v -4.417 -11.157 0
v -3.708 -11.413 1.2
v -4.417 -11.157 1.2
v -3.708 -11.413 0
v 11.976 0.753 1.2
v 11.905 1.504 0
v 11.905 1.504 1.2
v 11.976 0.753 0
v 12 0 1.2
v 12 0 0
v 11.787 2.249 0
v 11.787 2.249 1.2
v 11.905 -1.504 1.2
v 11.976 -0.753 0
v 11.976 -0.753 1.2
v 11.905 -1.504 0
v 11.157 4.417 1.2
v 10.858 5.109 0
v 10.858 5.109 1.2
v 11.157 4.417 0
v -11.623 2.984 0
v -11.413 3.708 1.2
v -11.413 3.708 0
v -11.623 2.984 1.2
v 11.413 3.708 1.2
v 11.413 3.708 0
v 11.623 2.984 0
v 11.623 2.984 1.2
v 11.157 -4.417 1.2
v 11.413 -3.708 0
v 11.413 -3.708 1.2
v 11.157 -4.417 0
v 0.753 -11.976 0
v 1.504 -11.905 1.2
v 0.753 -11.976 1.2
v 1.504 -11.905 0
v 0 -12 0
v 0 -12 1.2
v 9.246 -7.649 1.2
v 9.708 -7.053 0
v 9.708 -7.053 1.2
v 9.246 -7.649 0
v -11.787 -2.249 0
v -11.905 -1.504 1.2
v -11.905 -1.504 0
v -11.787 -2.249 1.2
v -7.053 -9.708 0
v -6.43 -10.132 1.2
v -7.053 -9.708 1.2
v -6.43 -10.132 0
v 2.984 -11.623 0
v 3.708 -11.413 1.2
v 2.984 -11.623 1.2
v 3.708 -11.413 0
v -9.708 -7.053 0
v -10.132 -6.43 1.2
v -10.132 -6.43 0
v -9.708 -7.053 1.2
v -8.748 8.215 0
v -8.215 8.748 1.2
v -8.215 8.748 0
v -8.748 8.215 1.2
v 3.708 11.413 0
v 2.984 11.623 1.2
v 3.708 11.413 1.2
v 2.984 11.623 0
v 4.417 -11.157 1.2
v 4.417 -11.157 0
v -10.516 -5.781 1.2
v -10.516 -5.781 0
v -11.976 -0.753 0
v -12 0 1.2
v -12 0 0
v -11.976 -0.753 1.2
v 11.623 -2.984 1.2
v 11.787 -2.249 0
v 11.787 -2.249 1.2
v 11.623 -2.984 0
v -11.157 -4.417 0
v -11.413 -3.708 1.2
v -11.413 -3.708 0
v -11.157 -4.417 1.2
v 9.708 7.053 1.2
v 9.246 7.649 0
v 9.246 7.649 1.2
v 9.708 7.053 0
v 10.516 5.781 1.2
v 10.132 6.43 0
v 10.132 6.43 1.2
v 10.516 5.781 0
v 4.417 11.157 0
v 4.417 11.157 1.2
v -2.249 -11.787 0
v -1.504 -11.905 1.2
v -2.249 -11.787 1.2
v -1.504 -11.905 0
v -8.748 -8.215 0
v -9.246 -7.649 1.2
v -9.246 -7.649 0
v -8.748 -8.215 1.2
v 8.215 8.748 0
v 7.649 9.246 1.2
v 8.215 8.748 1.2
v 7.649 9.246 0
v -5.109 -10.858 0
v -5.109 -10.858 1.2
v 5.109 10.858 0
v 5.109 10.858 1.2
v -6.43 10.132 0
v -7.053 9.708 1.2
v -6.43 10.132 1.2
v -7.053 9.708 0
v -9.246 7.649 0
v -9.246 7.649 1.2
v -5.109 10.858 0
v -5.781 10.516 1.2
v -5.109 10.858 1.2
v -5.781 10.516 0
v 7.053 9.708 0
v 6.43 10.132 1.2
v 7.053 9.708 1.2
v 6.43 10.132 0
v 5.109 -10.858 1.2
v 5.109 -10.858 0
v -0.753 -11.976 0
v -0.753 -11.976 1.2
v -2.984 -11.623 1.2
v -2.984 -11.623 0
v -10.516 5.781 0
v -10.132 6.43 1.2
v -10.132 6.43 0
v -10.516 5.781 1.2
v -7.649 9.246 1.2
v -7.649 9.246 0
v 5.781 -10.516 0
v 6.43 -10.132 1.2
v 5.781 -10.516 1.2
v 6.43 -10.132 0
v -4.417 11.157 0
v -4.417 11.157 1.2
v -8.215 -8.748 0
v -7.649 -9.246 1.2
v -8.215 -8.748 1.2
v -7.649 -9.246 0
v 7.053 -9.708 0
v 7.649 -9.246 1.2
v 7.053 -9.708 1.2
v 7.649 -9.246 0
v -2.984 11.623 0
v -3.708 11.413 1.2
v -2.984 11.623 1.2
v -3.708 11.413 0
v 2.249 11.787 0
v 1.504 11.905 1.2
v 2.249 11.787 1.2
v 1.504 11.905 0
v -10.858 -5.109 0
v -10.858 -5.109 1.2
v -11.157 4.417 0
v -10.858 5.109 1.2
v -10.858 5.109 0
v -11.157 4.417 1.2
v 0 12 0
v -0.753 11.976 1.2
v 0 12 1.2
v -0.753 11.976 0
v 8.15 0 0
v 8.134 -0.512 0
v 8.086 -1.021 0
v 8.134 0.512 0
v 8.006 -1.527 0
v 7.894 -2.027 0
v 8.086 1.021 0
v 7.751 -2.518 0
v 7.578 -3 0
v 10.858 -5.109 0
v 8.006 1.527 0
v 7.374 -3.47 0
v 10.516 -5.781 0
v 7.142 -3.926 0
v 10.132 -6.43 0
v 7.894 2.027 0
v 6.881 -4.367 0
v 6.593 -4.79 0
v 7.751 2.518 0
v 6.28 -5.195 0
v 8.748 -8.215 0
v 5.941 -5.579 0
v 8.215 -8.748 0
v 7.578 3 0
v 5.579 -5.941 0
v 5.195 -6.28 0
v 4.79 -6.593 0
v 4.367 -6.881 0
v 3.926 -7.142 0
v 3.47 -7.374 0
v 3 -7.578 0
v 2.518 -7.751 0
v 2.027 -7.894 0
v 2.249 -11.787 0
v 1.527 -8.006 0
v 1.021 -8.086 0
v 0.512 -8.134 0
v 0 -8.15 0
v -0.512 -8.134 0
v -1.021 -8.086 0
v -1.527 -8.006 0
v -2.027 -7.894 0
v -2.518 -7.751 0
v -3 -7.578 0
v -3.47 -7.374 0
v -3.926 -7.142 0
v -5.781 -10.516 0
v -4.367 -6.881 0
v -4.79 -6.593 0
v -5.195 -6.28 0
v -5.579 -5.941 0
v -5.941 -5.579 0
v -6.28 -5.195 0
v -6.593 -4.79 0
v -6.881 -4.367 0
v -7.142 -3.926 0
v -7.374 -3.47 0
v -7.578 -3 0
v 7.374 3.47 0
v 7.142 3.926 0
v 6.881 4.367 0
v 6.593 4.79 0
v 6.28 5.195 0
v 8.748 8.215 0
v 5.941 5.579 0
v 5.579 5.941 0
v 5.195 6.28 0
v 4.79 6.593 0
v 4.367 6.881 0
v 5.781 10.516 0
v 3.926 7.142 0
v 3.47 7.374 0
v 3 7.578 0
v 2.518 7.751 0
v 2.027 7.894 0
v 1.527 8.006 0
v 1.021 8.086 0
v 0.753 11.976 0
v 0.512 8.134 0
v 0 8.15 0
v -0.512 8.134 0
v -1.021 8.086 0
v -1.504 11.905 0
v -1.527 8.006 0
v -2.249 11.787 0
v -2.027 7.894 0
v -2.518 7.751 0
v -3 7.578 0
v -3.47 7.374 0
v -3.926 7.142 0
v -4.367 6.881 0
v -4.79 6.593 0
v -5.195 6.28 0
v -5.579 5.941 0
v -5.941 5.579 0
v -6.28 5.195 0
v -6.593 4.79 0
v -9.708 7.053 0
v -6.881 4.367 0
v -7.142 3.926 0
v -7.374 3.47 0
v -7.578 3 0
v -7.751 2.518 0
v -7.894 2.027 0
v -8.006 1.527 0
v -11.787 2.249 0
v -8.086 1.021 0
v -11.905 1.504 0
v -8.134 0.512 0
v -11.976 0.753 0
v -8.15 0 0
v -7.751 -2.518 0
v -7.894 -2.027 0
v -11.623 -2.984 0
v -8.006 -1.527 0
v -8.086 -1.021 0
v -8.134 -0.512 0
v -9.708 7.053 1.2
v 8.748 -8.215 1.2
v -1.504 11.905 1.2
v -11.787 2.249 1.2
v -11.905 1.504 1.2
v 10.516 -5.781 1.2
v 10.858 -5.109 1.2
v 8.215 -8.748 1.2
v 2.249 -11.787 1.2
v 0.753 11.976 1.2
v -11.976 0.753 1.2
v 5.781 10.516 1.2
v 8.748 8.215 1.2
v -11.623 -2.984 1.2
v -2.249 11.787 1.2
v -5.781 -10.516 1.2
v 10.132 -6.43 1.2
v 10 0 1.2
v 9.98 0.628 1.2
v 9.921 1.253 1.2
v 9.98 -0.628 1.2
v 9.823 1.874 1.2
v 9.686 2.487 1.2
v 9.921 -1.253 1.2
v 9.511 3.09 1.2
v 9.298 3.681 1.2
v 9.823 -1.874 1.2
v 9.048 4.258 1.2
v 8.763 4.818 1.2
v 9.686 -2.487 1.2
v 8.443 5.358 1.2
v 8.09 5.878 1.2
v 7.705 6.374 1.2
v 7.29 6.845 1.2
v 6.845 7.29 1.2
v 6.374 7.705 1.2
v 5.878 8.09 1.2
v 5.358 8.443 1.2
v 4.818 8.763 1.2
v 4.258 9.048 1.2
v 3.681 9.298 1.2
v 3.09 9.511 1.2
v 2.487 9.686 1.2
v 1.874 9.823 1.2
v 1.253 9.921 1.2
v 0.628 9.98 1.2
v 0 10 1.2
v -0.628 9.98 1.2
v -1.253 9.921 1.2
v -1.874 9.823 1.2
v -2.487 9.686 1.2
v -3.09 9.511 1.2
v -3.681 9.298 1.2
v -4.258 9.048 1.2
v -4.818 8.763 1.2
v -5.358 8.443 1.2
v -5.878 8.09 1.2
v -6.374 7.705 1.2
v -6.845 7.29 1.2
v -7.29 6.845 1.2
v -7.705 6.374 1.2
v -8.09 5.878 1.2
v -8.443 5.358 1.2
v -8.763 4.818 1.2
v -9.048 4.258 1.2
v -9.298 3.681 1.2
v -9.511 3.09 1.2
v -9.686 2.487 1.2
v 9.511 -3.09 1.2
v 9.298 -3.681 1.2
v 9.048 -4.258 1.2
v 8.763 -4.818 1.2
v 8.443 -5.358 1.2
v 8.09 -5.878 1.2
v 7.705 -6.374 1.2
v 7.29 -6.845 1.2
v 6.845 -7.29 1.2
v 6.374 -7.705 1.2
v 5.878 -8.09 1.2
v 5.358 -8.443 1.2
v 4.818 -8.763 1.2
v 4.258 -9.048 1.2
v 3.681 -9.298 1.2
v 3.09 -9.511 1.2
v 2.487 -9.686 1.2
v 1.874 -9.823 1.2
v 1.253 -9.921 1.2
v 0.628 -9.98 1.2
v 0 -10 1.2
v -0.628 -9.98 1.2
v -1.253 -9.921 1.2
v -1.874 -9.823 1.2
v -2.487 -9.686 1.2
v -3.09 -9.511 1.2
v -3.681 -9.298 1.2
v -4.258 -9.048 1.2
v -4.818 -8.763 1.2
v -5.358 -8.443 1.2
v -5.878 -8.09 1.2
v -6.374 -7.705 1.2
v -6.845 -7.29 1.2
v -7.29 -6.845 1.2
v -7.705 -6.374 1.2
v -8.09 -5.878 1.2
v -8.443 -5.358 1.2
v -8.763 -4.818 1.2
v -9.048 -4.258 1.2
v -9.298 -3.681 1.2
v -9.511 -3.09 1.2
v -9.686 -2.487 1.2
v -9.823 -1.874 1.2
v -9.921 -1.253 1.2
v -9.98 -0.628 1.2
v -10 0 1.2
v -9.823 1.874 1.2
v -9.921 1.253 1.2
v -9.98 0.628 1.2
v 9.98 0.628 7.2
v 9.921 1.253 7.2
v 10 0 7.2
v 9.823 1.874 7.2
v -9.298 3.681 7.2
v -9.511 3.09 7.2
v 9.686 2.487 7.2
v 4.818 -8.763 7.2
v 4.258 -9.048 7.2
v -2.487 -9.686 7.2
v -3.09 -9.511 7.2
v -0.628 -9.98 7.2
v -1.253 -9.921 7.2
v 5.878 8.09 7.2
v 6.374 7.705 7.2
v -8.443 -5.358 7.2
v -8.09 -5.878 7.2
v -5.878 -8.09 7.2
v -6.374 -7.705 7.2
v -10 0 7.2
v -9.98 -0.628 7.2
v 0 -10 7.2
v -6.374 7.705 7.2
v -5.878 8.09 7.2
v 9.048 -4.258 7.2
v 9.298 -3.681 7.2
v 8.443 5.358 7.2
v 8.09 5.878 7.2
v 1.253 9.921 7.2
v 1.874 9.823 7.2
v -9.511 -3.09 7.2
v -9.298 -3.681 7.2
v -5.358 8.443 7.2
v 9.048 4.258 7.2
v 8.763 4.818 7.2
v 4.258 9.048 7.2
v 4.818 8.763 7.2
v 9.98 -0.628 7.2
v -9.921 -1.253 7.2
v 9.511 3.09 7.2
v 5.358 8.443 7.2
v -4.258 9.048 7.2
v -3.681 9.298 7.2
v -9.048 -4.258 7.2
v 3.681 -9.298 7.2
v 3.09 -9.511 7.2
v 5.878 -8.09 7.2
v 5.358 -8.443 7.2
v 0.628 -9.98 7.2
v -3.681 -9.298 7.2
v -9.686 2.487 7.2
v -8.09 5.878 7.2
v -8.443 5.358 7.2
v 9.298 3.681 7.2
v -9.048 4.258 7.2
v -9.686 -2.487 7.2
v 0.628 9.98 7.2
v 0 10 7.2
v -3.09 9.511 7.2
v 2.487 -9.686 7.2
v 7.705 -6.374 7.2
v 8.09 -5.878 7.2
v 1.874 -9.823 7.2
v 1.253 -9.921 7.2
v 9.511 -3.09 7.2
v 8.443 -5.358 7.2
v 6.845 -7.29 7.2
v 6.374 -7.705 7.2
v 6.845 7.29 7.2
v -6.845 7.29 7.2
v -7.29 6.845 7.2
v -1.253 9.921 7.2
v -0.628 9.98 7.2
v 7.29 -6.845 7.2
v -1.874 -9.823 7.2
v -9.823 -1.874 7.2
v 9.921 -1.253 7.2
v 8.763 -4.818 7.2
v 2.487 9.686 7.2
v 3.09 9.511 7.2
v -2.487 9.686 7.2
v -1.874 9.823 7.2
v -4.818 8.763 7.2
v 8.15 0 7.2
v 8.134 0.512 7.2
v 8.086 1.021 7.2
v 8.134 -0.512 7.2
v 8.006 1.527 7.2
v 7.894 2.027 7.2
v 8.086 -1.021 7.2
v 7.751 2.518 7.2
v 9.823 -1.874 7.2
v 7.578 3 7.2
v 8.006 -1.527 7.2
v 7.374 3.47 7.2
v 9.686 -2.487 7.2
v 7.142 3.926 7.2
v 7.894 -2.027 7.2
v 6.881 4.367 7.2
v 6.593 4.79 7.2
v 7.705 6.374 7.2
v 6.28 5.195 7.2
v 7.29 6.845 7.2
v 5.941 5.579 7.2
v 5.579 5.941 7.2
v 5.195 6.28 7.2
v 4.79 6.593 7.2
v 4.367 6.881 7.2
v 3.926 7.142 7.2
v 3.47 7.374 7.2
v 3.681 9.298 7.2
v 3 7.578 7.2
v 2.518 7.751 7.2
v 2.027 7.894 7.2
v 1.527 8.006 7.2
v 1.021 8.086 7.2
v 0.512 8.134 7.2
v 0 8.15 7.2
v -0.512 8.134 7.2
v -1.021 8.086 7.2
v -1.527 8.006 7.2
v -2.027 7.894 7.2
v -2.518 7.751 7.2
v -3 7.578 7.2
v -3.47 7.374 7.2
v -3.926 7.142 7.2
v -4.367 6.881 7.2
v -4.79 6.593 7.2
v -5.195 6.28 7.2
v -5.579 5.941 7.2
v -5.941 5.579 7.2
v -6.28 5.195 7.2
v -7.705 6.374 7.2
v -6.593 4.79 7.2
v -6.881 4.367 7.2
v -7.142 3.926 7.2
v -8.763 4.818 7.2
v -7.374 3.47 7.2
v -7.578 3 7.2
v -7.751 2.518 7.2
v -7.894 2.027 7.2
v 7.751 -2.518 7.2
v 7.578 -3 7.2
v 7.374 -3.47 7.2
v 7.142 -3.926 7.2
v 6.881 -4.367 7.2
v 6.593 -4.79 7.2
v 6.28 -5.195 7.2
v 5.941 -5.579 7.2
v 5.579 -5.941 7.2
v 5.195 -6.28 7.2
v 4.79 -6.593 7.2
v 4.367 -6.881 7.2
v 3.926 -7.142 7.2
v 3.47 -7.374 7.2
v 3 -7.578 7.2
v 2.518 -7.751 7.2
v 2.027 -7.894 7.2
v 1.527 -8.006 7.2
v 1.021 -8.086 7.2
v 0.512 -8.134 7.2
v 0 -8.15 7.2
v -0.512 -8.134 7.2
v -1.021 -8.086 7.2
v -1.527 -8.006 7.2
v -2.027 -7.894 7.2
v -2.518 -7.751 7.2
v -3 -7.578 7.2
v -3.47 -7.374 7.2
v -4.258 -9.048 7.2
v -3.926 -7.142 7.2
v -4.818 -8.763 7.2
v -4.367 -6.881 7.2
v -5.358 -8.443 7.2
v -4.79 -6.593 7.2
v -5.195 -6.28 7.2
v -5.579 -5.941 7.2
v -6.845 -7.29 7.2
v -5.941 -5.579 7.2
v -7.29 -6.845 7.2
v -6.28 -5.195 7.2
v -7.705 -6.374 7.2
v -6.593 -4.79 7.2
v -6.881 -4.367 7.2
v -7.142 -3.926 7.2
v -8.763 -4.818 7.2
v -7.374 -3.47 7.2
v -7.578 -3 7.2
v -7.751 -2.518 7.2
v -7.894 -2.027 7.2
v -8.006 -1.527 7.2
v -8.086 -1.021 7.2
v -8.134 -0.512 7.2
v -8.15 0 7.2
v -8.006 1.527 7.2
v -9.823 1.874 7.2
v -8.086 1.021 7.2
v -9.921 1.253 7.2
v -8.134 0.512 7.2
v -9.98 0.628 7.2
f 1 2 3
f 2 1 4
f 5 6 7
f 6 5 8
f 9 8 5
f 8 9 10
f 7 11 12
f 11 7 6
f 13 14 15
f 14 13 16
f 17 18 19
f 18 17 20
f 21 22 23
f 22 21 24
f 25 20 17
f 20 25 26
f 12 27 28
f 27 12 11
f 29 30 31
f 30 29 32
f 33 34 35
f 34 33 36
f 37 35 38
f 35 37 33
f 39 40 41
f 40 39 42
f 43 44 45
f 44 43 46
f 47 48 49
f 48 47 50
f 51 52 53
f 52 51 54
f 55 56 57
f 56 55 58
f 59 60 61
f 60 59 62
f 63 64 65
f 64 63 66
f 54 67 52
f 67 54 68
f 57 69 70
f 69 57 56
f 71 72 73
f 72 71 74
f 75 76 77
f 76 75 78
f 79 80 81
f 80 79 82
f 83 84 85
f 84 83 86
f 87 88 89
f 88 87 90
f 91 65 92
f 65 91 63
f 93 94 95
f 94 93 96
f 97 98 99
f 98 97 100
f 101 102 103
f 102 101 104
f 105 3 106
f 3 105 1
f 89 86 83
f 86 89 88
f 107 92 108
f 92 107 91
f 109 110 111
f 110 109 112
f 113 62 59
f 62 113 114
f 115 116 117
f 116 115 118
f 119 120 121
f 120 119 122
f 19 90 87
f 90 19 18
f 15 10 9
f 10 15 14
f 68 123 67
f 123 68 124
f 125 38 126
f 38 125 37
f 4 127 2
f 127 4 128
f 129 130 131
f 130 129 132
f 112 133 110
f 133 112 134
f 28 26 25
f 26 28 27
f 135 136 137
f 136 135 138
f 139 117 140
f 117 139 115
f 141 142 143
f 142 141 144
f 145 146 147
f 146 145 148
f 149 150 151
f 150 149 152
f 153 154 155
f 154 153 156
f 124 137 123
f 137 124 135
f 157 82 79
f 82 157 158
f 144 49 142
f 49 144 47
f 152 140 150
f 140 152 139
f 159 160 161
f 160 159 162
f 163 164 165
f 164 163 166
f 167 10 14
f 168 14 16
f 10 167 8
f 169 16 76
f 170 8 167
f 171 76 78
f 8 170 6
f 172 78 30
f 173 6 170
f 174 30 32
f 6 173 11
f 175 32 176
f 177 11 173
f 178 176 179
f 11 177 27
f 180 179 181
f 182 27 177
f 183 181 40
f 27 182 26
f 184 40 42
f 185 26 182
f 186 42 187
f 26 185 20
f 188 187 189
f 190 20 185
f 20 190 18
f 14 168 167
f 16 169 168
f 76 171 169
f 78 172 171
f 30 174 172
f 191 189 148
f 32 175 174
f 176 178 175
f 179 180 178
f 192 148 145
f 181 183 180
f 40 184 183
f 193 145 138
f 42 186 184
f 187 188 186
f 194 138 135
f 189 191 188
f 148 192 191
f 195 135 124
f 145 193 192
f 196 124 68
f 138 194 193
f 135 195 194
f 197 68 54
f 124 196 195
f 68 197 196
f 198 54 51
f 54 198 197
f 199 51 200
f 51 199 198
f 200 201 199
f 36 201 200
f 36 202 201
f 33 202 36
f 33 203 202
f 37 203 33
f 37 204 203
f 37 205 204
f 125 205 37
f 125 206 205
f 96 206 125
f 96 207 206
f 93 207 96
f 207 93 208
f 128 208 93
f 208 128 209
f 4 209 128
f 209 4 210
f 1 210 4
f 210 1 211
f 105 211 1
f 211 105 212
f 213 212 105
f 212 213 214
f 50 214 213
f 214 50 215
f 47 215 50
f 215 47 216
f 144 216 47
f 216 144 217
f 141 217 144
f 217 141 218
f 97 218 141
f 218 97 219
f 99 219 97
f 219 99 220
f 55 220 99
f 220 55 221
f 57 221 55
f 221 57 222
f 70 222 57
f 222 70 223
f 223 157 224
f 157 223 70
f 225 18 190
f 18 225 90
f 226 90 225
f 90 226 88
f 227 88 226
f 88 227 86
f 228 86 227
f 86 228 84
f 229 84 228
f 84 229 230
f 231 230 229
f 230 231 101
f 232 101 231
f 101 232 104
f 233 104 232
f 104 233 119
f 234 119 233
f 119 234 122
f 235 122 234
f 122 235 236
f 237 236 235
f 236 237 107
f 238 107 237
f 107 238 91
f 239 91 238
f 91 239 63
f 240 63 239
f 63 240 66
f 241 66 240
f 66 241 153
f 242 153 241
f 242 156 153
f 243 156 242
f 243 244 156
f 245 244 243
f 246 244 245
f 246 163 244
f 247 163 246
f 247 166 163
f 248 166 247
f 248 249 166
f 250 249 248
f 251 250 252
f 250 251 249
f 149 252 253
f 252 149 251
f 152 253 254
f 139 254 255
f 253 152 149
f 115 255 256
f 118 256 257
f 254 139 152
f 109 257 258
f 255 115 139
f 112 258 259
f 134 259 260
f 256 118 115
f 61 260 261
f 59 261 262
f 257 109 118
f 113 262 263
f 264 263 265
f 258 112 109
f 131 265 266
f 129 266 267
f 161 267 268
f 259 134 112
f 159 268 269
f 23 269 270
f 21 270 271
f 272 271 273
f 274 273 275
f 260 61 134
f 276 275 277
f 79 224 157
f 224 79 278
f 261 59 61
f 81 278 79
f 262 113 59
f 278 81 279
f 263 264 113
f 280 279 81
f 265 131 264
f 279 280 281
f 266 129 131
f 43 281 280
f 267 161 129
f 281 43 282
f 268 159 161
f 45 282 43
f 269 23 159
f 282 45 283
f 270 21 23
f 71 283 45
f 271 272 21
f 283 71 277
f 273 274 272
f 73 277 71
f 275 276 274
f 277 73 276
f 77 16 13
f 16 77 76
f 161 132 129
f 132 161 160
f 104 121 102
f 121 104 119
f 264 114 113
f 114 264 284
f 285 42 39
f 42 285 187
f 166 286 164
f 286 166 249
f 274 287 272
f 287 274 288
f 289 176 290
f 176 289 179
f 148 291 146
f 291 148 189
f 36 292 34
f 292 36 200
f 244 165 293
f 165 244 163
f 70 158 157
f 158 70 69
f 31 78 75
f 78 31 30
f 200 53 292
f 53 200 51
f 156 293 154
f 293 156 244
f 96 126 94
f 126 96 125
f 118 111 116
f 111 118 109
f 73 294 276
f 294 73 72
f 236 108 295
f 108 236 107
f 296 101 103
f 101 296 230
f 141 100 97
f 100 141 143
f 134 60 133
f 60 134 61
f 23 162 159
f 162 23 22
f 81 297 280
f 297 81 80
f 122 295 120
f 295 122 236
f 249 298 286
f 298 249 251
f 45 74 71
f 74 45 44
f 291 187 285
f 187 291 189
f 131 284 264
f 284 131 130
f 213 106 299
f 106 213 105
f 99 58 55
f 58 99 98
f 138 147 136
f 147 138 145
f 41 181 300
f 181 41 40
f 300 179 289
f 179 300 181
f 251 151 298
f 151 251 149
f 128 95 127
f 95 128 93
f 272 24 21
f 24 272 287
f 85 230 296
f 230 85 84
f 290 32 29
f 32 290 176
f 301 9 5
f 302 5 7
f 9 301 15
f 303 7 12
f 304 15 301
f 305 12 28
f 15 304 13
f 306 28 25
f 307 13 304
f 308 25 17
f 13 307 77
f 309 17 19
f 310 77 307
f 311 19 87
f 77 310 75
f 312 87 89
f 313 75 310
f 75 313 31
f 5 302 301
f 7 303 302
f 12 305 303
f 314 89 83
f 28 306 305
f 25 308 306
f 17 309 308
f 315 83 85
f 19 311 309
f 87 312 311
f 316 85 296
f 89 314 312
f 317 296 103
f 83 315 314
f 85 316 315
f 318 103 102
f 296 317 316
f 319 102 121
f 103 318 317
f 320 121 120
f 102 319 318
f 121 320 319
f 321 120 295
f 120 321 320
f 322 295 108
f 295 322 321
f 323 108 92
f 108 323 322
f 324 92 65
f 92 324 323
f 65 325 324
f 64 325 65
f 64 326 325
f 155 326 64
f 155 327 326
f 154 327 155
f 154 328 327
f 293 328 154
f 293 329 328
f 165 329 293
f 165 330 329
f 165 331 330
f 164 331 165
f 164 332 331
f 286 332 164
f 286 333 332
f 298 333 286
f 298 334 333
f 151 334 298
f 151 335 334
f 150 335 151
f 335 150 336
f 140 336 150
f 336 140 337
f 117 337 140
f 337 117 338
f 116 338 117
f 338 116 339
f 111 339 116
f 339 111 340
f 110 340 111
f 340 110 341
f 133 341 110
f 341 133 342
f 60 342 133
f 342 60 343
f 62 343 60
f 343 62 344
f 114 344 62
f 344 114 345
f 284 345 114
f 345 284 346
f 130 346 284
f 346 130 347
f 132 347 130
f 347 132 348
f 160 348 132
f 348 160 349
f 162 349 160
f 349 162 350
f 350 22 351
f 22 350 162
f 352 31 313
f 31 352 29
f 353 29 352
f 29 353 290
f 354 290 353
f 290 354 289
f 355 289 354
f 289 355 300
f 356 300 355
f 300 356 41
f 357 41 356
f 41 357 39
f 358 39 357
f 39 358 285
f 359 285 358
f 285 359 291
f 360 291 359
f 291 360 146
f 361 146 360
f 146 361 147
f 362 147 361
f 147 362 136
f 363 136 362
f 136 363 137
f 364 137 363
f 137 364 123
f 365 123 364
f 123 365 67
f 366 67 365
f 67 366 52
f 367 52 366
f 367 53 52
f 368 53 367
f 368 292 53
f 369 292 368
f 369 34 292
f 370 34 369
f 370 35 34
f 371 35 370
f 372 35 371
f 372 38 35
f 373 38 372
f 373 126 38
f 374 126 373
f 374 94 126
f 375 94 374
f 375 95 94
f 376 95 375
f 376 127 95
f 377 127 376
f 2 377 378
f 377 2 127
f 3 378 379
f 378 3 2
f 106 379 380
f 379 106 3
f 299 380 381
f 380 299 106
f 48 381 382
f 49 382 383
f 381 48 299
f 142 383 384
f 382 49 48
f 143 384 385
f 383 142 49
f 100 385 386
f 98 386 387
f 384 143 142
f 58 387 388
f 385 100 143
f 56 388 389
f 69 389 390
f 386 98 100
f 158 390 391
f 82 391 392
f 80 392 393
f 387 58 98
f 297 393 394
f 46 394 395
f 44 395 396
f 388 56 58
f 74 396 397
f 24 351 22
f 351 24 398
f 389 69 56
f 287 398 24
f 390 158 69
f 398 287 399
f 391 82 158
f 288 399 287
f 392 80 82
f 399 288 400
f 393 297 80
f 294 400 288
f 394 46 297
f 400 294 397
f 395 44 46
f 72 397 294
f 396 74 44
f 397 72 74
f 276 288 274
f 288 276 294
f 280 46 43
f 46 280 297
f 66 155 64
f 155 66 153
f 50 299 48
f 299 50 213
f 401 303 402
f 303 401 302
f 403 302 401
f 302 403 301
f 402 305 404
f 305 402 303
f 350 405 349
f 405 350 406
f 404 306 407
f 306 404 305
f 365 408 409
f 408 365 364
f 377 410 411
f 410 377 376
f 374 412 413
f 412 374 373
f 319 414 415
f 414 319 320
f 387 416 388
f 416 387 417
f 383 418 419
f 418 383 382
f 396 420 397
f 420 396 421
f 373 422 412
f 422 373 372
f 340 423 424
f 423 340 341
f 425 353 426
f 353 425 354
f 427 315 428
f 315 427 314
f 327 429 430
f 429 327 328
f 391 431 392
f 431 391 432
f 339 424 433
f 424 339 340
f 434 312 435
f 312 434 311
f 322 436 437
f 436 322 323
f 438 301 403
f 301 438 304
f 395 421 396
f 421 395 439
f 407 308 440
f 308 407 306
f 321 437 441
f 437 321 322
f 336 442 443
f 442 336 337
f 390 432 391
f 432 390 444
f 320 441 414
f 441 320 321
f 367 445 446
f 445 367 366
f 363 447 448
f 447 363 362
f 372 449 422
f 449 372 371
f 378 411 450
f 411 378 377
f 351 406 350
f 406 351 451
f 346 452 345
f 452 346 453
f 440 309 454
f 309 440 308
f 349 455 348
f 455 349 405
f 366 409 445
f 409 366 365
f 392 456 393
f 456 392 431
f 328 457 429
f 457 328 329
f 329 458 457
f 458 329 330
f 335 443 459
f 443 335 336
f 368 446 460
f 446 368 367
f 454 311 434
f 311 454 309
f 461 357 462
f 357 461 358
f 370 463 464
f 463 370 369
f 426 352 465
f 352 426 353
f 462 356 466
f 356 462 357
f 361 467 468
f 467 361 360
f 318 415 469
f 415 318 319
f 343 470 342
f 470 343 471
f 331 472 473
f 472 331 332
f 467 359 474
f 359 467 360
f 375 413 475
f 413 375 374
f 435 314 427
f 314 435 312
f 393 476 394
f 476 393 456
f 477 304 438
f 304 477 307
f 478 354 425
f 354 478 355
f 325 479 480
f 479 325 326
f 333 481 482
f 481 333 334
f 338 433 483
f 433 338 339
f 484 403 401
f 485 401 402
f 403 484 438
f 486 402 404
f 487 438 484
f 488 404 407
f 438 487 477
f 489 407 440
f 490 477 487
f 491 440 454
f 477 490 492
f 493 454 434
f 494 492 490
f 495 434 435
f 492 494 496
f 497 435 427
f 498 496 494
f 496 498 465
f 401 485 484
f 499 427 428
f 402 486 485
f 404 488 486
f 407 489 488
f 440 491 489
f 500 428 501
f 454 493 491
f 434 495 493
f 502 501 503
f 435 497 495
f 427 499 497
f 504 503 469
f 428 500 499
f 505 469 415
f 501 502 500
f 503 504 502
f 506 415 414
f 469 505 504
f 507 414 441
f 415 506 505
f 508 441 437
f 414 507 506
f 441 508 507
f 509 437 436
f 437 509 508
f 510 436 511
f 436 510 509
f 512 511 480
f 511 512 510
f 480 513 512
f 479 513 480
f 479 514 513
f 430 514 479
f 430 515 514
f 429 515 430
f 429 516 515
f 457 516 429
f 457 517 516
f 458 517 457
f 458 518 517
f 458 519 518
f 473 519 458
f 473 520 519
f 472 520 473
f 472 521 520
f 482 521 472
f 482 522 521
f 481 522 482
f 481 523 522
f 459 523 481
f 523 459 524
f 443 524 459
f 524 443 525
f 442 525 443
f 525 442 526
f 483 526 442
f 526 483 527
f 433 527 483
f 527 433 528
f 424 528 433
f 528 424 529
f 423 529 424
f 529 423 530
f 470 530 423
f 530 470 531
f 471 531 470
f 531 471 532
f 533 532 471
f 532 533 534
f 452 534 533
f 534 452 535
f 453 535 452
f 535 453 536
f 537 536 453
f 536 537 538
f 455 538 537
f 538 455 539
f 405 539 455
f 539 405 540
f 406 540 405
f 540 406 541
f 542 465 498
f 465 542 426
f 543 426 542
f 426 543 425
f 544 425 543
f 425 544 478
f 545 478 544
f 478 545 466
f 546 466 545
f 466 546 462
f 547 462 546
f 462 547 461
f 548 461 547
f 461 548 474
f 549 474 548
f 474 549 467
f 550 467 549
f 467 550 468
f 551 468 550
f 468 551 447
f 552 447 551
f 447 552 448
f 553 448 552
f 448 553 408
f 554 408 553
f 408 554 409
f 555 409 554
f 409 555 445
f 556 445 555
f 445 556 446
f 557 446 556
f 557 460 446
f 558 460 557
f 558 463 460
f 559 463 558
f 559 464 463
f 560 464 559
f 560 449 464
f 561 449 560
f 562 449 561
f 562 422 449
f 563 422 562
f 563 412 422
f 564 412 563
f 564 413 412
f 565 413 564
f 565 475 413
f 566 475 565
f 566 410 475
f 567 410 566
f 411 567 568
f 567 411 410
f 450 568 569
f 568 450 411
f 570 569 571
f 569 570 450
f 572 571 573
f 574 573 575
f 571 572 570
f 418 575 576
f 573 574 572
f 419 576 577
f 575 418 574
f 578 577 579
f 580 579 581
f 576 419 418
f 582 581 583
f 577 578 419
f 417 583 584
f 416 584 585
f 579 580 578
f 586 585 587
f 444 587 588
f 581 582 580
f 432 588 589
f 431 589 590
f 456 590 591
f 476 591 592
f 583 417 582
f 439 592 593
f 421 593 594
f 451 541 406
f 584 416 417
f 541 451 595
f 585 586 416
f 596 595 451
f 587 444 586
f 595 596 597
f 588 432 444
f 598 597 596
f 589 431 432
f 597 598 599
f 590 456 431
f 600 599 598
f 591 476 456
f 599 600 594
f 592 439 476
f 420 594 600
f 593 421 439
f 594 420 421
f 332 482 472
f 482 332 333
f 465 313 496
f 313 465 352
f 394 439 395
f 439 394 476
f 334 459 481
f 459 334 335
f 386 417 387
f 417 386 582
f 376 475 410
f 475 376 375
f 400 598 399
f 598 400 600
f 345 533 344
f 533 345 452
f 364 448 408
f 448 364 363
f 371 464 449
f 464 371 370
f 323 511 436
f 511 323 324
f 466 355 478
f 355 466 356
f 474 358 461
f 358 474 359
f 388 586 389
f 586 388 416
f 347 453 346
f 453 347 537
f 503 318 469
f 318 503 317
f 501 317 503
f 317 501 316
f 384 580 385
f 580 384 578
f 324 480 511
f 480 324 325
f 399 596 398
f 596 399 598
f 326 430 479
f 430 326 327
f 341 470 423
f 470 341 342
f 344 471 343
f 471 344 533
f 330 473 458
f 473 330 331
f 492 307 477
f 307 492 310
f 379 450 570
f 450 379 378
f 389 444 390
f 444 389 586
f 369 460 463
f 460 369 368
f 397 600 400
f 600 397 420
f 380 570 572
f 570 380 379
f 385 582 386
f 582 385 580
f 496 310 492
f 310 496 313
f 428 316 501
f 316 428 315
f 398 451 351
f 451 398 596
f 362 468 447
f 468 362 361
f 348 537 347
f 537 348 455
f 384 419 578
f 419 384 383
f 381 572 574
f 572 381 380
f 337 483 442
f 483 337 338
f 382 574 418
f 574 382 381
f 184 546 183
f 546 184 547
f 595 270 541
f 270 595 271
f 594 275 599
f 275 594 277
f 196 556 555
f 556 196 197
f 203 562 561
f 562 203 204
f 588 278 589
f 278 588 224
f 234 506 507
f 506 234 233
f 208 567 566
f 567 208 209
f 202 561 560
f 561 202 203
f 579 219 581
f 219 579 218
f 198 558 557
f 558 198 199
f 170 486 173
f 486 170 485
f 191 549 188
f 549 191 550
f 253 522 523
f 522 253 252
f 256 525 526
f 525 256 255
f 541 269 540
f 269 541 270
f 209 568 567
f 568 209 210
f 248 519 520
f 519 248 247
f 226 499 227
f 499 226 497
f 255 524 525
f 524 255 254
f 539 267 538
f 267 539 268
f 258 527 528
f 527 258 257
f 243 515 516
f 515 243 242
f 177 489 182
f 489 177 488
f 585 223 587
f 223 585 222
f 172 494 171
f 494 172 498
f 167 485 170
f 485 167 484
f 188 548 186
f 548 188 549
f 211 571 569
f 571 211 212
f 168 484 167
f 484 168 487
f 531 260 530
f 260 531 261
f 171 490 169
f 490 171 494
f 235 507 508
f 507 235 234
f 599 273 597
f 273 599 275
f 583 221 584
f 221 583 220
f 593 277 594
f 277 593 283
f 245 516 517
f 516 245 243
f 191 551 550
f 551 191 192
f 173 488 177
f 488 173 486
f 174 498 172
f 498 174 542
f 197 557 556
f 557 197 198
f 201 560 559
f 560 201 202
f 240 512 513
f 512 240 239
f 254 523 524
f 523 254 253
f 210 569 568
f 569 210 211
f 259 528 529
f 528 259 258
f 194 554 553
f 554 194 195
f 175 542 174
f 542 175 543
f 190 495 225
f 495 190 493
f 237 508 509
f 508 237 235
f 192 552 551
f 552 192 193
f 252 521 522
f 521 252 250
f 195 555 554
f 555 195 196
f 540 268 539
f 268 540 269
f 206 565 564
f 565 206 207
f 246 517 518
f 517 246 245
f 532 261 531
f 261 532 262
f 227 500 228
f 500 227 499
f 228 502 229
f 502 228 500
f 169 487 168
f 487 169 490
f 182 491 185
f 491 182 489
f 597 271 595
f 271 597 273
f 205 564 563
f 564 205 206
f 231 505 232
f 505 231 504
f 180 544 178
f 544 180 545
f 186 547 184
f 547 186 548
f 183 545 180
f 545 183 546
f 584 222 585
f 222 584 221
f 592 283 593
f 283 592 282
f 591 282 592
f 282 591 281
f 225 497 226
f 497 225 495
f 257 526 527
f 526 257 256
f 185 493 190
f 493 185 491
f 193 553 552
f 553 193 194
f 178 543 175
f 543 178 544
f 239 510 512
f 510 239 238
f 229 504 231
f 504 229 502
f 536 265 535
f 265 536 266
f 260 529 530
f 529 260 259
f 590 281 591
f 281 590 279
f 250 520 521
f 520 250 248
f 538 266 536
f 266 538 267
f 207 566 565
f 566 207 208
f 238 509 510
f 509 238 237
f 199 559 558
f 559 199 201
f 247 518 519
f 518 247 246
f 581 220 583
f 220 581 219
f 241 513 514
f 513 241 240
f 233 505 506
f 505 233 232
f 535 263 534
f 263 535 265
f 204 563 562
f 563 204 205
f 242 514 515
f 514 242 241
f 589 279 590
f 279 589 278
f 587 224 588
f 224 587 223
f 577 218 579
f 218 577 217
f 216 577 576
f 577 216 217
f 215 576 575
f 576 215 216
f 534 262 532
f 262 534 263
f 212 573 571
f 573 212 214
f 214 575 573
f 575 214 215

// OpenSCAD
// Mounting hole adapter
//
// Licensed under CC-BY 4.0, https://creativecommons.org/licenses/by/4.0/
// Copyright 2022, Bastien Nocera <hadess@hadess.net>


// Diameter of the mounting hole for the smaller part
small_hole_d = 16.3;

// Diameter of the mounting hole for the bigger/original part
large_hole_d = 20;

// Thickness of the wall on which to mount the part (must be exactly right if you want to use a washer on the inside
wall_thickness = 6;

// How much plastic overlaps the outside edge of the hole
lip_width = 2;

// Thickness of the outside lip, or washer (a multiple of the nozzle size is a good thickness)
lip_thickness = 1.2; 

$fn=100;

module adapter() {
    difference() {
        union() {
            cylinder(d=large_hole_d+lip_width*2, h=lip_thickness);
            cylinder(d=large_hole_d, h=wall_thickness+lip_thickness);
        }
        translate([0, 0, -0.1])
        cylinder(d=small_hole_d, h=wall_thickness+lip_thickness+1);
    }
}

module washer() {
    difference() {
        cylinder(d=large_hole_d+lip_width*2, h=lip_thickness);
        translate([0, 0, -0.1])
        cylinder(d=small_hole_d, h=wall_thickness+lip_thickness+1);
    }
}

adapter();
//washer();
